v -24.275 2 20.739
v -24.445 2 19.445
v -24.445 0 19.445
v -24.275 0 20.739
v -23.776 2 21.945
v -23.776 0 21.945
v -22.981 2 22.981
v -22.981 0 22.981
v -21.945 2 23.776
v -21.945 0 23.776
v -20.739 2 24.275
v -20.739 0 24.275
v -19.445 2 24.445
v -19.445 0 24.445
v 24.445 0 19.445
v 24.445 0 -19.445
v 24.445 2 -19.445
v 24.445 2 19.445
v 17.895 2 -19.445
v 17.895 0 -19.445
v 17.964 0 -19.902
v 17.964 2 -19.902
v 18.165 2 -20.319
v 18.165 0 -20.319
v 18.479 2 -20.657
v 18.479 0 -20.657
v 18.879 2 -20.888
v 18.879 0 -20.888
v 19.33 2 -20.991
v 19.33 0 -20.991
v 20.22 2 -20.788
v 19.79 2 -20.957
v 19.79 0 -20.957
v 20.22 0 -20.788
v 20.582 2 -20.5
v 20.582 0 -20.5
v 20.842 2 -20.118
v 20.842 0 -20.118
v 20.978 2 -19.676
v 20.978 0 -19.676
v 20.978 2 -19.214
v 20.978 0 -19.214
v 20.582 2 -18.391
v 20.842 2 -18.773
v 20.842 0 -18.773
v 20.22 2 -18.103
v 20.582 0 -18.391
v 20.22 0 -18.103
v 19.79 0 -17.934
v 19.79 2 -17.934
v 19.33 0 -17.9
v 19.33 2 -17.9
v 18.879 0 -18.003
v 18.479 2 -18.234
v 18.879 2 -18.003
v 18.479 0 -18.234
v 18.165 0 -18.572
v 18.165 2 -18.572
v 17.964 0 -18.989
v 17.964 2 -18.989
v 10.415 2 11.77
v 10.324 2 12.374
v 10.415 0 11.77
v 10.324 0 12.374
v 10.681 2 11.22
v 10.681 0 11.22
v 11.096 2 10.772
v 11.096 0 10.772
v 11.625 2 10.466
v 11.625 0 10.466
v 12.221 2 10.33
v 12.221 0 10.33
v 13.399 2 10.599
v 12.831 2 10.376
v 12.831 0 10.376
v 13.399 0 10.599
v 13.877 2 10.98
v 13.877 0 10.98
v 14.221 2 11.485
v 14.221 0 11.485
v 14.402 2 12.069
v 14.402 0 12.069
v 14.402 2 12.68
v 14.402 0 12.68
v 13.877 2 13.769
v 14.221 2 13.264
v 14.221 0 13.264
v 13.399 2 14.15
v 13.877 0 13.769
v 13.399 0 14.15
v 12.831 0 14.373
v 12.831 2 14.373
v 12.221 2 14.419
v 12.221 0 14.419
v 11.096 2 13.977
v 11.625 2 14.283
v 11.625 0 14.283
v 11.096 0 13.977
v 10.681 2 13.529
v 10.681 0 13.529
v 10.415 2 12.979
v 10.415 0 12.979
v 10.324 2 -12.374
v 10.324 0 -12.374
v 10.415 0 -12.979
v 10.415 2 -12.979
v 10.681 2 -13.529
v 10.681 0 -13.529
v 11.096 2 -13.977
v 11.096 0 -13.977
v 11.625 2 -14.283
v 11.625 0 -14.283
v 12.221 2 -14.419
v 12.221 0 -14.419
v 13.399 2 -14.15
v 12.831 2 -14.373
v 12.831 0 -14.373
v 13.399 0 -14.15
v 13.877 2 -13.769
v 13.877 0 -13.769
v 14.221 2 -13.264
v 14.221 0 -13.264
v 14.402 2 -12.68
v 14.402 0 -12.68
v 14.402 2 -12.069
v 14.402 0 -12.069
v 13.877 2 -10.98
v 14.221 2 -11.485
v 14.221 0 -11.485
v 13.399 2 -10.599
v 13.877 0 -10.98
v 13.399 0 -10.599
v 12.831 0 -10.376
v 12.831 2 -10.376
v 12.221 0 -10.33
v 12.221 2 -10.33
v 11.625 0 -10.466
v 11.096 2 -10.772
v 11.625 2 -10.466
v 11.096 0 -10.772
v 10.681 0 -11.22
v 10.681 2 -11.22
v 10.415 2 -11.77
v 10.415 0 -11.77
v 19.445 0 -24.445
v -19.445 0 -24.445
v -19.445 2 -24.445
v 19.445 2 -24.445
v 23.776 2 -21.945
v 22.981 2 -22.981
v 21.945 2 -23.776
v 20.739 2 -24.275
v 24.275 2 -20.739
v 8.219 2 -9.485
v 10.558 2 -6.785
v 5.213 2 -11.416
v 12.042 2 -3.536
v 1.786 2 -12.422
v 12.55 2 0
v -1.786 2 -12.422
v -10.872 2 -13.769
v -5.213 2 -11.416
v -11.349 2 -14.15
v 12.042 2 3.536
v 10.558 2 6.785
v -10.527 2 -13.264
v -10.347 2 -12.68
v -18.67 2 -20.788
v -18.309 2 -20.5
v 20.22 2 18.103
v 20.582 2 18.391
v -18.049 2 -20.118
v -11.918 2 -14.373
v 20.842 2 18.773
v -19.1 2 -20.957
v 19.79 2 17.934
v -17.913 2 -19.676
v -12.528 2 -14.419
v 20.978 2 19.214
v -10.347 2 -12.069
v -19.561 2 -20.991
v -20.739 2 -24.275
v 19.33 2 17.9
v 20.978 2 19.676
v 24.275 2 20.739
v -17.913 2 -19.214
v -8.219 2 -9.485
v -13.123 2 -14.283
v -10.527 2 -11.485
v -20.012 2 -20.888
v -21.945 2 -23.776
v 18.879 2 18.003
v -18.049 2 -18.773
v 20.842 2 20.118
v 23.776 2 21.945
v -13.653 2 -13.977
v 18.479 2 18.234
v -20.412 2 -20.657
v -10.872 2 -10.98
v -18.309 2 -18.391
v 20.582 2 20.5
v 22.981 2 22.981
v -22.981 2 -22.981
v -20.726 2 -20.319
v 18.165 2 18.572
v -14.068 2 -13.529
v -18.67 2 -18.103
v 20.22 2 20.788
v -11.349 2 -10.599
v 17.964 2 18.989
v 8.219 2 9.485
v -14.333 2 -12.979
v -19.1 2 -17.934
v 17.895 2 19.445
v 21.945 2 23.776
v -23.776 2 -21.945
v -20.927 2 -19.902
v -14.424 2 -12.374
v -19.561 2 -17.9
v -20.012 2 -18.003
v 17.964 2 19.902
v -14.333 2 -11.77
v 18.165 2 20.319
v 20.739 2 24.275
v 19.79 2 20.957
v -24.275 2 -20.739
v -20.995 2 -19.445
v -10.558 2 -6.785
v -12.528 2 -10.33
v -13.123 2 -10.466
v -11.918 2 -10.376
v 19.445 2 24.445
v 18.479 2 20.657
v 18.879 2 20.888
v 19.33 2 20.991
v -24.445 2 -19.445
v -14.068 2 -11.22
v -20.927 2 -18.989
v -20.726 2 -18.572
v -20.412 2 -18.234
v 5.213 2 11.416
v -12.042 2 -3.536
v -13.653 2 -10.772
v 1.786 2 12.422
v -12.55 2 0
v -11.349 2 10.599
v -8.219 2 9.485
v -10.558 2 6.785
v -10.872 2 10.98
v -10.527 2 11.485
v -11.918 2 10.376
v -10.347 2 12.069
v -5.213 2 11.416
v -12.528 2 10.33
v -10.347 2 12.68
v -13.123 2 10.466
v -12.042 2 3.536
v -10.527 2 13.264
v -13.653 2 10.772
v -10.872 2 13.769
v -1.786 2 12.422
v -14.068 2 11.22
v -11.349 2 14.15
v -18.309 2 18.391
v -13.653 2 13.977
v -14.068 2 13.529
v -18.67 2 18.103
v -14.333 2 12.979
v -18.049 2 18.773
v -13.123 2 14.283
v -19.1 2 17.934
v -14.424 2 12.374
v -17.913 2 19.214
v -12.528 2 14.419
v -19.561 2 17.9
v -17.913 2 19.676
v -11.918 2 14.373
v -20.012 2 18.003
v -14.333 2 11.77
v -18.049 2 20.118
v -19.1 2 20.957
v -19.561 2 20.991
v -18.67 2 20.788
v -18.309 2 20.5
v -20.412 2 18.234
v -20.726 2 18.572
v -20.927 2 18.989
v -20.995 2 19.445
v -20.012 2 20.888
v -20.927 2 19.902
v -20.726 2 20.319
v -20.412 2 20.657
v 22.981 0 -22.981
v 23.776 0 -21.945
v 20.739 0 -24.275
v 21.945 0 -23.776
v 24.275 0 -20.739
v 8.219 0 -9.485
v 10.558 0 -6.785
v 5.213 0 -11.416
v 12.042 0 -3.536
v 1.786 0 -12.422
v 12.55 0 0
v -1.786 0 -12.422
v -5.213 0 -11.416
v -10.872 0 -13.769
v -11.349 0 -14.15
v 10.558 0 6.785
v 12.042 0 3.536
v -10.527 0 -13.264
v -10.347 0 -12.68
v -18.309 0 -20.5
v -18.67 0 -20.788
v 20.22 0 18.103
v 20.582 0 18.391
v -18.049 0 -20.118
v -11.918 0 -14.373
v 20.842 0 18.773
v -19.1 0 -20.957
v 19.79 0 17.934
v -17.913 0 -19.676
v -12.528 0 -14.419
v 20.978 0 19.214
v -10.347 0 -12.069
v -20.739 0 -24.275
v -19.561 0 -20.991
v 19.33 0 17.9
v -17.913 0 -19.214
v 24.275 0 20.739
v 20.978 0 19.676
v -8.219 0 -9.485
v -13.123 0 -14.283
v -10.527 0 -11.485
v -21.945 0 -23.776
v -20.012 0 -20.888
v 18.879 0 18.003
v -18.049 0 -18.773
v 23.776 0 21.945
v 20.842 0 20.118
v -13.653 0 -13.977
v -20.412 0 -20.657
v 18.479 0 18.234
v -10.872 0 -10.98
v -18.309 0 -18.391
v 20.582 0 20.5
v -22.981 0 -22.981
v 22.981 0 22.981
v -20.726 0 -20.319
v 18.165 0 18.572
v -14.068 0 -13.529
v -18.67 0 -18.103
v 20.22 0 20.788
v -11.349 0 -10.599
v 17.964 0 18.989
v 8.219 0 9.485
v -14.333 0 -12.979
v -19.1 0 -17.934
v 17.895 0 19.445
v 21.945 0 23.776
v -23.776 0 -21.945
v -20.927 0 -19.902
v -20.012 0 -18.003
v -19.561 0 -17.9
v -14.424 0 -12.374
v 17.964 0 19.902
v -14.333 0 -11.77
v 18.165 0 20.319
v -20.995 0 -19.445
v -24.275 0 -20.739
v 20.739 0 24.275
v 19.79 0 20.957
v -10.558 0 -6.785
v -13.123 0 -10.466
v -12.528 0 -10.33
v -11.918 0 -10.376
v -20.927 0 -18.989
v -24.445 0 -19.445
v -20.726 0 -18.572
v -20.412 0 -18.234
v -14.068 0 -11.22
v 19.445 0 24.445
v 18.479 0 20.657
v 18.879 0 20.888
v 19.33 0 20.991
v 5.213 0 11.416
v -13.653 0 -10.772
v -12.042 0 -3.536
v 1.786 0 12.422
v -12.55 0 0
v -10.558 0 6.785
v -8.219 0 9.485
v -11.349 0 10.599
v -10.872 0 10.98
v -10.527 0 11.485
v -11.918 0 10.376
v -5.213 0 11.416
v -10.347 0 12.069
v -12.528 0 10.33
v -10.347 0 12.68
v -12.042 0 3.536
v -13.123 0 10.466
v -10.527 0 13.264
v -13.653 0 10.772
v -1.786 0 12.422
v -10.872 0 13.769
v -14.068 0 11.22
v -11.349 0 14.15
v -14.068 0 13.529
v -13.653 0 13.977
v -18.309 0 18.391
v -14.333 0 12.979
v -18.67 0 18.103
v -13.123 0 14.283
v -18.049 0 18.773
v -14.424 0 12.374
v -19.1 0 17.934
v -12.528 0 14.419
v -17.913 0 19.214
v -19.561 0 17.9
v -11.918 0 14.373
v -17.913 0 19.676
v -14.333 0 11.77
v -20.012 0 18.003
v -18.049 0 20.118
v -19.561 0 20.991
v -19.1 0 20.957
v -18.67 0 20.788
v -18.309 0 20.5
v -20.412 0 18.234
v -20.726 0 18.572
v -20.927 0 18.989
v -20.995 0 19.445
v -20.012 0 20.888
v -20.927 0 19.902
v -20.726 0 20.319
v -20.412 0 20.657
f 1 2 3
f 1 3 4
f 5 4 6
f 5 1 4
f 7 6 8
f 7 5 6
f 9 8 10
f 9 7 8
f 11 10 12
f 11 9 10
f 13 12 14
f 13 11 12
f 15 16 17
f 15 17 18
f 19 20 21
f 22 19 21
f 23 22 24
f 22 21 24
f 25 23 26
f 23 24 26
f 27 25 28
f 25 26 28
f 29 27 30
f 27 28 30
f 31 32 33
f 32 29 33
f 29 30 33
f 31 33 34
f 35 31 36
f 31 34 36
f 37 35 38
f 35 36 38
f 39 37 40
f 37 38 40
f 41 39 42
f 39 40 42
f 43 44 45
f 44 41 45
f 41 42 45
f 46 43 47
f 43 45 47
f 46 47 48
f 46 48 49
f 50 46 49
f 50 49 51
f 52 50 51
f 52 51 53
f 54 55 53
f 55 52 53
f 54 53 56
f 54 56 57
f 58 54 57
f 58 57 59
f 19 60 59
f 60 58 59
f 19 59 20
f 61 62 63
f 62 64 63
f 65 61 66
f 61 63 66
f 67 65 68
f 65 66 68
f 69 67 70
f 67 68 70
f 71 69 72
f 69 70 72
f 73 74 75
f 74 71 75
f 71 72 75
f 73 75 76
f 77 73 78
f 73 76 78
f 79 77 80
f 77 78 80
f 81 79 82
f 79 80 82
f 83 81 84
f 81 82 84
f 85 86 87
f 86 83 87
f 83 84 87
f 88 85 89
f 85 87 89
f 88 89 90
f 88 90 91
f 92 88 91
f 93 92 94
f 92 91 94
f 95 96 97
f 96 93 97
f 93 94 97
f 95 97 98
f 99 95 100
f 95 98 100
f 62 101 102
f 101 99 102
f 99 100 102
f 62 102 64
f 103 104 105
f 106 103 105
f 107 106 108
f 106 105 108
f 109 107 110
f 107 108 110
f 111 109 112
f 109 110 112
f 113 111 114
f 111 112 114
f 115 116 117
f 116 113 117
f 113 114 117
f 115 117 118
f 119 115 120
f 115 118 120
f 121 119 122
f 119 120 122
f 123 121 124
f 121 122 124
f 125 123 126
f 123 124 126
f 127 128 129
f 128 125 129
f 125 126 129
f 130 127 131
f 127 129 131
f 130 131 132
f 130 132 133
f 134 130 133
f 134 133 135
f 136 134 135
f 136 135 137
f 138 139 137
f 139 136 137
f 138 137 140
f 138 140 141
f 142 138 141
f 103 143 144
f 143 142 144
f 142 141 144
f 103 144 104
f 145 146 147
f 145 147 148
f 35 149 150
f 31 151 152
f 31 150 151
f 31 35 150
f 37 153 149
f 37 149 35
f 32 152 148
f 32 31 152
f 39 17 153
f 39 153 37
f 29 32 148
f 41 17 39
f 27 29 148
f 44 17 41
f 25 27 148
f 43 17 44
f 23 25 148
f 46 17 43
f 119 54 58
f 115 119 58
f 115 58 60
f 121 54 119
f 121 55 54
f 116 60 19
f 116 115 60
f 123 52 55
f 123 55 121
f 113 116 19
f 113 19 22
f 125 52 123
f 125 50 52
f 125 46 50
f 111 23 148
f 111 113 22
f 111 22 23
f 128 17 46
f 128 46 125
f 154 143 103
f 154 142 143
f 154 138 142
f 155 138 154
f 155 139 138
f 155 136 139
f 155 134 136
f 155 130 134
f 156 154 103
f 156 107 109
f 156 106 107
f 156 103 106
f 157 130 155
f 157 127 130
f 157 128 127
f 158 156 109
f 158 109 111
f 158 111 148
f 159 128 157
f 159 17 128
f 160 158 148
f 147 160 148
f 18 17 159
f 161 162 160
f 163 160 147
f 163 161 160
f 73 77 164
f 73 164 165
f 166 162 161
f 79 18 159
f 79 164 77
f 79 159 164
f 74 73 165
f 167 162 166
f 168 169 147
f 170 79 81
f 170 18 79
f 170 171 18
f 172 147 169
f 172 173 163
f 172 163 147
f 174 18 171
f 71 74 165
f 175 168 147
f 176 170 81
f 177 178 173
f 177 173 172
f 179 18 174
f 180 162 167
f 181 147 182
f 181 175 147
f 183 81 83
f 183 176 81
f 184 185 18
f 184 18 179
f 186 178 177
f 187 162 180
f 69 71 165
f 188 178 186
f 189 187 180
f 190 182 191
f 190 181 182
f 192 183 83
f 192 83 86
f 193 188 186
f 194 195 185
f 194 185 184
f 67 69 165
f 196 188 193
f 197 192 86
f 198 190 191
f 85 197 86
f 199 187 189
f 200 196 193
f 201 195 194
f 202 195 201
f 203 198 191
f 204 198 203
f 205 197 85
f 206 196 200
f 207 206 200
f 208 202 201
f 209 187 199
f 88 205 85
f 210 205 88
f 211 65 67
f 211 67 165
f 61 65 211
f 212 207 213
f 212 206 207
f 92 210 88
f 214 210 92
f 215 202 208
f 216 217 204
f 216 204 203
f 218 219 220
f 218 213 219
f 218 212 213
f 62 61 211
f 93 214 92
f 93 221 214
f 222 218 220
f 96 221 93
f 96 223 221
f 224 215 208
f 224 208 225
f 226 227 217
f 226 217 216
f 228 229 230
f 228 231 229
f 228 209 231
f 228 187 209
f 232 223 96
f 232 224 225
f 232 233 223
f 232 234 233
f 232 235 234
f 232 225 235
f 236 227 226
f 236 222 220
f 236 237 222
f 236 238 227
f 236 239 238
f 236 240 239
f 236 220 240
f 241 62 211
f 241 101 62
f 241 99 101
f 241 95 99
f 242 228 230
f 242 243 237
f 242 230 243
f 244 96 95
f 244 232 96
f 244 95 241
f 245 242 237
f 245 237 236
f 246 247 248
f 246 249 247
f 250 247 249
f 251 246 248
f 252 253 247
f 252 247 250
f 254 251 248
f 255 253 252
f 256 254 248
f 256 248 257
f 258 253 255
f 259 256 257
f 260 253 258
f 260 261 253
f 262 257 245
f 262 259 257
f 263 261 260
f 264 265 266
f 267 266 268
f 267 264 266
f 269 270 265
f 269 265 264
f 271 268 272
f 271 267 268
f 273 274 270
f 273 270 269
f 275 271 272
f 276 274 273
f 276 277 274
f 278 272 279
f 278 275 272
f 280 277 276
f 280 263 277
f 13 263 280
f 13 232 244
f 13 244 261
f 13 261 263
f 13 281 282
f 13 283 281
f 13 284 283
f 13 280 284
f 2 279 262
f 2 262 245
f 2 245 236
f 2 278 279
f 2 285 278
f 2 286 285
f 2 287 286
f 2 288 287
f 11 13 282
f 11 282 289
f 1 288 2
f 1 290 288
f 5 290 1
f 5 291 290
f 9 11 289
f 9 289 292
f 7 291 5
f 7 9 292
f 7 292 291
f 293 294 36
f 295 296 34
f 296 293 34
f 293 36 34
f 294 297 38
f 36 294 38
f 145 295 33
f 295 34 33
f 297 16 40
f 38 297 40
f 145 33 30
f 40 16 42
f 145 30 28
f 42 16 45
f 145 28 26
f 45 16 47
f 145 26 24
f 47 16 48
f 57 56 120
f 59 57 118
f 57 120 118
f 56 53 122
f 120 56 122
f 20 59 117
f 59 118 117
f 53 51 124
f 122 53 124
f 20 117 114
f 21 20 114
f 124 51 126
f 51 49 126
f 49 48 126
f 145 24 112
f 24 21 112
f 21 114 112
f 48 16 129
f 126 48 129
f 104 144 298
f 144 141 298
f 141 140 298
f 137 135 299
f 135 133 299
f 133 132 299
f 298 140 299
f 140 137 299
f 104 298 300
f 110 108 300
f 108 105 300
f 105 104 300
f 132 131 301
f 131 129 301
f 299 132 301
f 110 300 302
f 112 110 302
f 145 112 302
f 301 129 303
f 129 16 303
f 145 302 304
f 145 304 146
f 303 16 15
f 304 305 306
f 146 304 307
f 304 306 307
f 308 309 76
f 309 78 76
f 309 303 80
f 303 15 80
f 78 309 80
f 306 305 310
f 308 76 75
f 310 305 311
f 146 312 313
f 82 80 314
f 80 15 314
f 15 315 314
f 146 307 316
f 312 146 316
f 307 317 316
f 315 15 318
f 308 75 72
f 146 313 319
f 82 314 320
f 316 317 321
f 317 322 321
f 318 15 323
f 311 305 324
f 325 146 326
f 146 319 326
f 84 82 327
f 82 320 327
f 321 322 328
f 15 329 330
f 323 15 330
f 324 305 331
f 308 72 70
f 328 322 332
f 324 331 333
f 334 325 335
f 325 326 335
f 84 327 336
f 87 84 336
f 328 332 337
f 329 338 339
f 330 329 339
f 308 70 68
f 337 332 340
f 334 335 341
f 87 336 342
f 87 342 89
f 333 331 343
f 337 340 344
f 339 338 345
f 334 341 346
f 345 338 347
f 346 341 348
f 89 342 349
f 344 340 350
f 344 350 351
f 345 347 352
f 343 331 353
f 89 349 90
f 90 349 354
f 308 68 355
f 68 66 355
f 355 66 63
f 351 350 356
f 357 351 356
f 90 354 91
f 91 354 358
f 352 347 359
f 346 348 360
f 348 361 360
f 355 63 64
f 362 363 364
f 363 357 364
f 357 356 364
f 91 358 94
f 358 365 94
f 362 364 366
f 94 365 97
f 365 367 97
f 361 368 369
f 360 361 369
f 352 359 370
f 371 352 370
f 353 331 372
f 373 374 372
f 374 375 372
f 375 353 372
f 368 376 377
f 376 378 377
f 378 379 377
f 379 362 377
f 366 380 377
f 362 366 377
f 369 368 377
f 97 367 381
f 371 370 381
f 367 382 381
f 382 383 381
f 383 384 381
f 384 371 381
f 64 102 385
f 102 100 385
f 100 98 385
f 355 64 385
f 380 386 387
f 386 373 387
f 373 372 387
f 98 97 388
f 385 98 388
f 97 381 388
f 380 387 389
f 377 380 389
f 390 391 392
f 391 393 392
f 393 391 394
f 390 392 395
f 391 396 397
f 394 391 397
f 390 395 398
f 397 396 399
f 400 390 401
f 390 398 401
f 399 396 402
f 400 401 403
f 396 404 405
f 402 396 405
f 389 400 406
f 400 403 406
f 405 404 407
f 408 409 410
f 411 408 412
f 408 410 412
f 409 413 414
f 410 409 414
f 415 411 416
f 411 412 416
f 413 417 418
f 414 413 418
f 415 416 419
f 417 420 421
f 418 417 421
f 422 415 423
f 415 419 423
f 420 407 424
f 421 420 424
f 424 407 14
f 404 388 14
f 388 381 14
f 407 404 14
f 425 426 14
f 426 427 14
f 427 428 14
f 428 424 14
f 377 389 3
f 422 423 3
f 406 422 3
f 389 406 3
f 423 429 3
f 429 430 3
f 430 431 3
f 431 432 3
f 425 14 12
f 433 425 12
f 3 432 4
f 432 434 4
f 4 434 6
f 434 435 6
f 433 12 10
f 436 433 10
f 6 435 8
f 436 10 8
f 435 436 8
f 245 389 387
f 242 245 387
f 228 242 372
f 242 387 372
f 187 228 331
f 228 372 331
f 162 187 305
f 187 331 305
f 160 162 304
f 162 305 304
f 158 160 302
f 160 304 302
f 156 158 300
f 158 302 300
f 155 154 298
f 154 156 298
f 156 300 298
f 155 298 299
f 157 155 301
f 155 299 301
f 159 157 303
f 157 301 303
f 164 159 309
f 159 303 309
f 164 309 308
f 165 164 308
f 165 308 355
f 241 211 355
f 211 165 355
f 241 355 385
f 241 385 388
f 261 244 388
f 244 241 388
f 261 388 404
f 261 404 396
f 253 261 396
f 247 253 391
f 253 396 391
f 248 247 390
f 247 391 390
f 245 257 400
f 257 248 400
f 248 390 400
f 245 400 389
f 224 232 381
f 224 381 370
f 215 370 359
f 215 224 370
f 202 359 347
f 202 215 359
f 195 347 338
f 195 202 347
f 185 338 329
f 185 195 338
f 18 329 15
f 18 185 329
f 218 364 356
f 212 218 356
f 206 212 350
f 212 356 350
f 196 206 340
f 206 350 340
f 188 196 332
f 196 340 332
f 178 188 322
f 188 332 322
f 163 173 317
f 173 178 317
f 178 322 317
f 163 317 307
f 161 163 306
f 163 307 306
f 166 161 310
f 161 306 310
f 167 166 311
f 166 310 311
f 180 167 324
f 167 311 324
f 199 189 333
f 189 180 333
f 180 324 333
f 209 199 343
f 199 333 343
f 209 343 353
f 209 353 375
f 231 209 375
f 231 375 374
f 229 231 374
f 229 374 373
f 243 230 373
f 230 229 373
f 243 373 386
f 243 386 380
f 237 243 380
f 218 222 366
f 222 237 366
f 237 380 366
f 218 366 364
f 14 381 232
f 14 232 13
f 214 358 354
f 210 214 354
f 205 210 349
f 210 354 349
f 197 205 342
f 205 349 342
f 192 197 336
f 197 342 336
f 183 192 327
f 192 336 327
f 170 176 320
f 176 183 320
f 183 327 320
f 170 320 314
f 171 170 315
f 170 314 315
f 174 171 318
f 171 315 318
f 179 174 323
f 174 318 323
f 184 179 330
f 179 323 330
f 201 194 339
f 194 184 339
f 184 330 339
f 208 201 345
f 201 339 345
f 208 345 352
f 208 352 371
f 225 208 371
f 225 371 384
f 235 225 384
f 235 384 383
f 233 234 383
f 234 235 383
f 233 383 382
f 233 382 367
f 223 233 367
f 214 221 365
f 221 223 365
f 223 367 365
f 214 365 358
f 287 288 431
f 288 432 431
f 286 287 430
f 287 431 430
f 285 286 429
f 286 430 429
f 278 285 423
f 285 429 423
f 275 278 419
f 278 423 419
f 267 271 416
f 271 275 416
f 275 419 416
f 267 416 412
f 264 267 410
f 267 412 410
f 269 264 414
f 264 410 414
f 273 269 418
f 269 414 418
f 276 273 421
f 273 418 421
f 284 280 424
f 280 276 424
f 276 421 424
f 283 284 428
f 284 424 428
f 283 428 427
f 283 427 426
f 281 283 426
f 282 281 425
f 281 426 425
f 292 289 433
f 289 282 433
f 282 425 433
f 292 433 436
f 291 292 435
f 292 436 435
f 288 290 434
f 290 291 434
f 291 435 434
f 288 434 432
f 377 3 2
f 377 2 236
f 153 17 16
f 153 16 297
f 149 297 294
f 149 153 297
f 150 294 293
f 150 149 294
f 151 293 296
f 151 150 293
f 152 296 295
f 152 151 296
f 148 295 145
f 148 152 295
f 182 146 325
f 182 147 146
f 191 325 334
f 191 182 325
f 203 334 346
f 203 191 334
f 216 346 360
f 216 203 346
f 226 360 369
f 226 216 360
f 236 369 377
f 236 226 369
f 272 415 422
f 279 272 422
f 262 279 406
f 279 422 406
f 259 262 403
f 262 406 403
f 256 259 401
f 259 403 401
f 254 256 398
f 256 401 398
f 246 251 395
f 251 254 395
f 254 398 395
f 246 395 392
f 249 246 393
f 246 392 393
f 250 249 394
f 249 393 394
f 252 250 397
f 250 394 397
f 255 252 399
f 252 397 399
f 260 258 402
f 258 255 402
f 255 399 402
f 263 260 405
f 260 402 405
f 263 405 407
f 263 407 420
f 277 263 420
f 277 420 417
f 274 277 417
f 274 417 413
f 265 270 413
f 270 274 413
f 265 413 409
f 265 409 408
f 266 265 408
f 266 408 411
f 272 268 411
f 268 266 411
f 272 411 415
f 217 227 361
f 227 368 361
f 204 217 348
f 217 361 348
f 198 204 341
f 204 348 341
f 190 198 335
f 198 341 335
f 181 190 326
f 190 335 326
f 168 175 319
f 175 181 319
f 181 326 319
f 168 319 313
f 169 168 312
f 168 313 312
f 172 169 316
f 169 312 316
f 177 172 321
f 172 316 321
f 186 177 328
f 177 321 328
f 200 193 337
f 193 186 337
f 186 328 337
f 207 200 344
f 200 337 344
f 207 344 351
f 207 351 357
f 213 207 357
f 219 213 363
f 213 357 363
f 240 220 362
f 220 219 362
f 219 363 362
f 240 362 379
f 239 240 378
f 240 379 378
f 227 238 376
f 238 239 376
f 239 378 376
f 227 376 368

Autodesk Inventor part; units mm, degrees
ref_plane "YZ Plane" through (0, 0, 0) normal (1, 0, 0) x (0, 1, 0)
ref_plane "XZ Plane" through (0, 0, 0) normal (0, 1, 0) x (-1, 0, 0)
ref_plane "XY Plane" through (0, 0, 0) normal (0, 0, 1) x (1, 0, 0)
sketch "スケッチ1" plane through (0, 0, 0) normal (0, 1, 0) x (-1, 0, 0)
  circle A0 centre (0, 0) radius 12.55
  line L0 (0, 0) -> (0, -12.55) construction
  circle A1 centre (12.3744, -12.3744) radius 2.05
  line L1 (0, 0) -> (8.8742, -8.8742) construction
  circle A2 centre (19.4454, -19.4454) radius 1.55
  circle A3 centre (0, 0) radius 27.5 construction
  circle A4 centre (19.4454, 19.4454) radius 1.55
  circle A5 centre (-19.4454, 19.4454) radius 1.55
  circle A6 centre (-19.4454, -19.4454) radius 1.55
  line L2 (-24.4454, 24.4454) -> (24.4454, 24.4454)
  line L3 (24.4454, 24.4454) -> (24.4454, -24.4454)
  line L4 (24.4454, -24.4454) -> (-24.4454, -24.4454)
  line L5 (-24.4454, -24.4454) -> (-24.4454, 24.4454)
  line L6 (-24.4454, 24.4454) -> (24.4454, -24.4454) construction
  line L7 (24.4454, 24.4454) -> (-24.4454, -24.4454) construction
  circle A7 centre (12.3744, 12.3744) radius 2.05
  circle A8 centre (-12.3744, 12.3744) radius 2.05
  circle A9 centre (-12.3744, -12.3744) radius 2.05
  dimension "d9" = 55
  dimension "d0" = 25.1
  dimension "d1" = 4.1
  dimension "d7" = 45
  dimension "d8" = 3.1
  dimension "d12" = 360
  dimension "d14" = 5
  dimension "d20" = 360
  dimension "d22" = 35
extrude "押し出し1" add sketch "スケッチ1" along normal blind 2
fillet "フィレット1" radius 5 4 edges at (24.4454, 1, 24.4454) (24.4454, 1, -24.4454) (-24.4454, 1, -24.4454) (-24.4454, 1, 24.4454)
sketch "スケッチ2" plane through (0, 2, 0) normal (0, 1, 0) x (1, 0, 0)
  arc A0 (-24.4454, -19.4454) -> (-19.4454, -24.4454) centre (-19.4454, -19.4454) ccw projected
  line L0 (-19.4454, -24.4454) -> (19.4454, -24.4454) projected
  arc A1 (19.4454, -24.4454) -> (24.4454, -19.4454) centre (19.4454, -19.4454) ccw projected
  line L1 (24.4454, -19.4454) -> (24.4454, 19.4454) projected
  arc A2 (24.4454, 19.4454) -> (19.4454, 24.4454) centre (19.4454, 19.4454) ccw projected
  line L2 (19.4454, 24.4454) -> (-19.4454, 24.4454) projected
  arc A3 (-19.4454, 24.4454) -> (-24.4454, 19.4454) centre (-19.4454, 19.4454) ccw projected
  line L3 (-24.4454, 19.4454) -> (-24.4454, -19.4454) projected
  circle A4 centre (-19.4454, 19.4454) radius 1.55 projected
  circle A5 centre (-19.4454, -19.4454) radius 1.55 projected
  circle A6 centre (19.4454, -19.4454) radius 1.55 projected
  circle A7 centre (19.4454, 19.4454) radius 1.55 projected
  circle A8 centre (12.3744, 12.3744) radius 2.05 projected
  circle A9 centre (12.3744, -12.3744) radius 2.05 projected
  circle A10 centre (-12.3744, -12.3744) radius 2.05 projected
  circle A11 centre (-12.3744, 12.3744) radius 2.05 projected
  circle A12 centre (0, 0) radius 12.55 projected
properties part number "omu_al_jo_2" material "アルミニウム 6061-AHC"
